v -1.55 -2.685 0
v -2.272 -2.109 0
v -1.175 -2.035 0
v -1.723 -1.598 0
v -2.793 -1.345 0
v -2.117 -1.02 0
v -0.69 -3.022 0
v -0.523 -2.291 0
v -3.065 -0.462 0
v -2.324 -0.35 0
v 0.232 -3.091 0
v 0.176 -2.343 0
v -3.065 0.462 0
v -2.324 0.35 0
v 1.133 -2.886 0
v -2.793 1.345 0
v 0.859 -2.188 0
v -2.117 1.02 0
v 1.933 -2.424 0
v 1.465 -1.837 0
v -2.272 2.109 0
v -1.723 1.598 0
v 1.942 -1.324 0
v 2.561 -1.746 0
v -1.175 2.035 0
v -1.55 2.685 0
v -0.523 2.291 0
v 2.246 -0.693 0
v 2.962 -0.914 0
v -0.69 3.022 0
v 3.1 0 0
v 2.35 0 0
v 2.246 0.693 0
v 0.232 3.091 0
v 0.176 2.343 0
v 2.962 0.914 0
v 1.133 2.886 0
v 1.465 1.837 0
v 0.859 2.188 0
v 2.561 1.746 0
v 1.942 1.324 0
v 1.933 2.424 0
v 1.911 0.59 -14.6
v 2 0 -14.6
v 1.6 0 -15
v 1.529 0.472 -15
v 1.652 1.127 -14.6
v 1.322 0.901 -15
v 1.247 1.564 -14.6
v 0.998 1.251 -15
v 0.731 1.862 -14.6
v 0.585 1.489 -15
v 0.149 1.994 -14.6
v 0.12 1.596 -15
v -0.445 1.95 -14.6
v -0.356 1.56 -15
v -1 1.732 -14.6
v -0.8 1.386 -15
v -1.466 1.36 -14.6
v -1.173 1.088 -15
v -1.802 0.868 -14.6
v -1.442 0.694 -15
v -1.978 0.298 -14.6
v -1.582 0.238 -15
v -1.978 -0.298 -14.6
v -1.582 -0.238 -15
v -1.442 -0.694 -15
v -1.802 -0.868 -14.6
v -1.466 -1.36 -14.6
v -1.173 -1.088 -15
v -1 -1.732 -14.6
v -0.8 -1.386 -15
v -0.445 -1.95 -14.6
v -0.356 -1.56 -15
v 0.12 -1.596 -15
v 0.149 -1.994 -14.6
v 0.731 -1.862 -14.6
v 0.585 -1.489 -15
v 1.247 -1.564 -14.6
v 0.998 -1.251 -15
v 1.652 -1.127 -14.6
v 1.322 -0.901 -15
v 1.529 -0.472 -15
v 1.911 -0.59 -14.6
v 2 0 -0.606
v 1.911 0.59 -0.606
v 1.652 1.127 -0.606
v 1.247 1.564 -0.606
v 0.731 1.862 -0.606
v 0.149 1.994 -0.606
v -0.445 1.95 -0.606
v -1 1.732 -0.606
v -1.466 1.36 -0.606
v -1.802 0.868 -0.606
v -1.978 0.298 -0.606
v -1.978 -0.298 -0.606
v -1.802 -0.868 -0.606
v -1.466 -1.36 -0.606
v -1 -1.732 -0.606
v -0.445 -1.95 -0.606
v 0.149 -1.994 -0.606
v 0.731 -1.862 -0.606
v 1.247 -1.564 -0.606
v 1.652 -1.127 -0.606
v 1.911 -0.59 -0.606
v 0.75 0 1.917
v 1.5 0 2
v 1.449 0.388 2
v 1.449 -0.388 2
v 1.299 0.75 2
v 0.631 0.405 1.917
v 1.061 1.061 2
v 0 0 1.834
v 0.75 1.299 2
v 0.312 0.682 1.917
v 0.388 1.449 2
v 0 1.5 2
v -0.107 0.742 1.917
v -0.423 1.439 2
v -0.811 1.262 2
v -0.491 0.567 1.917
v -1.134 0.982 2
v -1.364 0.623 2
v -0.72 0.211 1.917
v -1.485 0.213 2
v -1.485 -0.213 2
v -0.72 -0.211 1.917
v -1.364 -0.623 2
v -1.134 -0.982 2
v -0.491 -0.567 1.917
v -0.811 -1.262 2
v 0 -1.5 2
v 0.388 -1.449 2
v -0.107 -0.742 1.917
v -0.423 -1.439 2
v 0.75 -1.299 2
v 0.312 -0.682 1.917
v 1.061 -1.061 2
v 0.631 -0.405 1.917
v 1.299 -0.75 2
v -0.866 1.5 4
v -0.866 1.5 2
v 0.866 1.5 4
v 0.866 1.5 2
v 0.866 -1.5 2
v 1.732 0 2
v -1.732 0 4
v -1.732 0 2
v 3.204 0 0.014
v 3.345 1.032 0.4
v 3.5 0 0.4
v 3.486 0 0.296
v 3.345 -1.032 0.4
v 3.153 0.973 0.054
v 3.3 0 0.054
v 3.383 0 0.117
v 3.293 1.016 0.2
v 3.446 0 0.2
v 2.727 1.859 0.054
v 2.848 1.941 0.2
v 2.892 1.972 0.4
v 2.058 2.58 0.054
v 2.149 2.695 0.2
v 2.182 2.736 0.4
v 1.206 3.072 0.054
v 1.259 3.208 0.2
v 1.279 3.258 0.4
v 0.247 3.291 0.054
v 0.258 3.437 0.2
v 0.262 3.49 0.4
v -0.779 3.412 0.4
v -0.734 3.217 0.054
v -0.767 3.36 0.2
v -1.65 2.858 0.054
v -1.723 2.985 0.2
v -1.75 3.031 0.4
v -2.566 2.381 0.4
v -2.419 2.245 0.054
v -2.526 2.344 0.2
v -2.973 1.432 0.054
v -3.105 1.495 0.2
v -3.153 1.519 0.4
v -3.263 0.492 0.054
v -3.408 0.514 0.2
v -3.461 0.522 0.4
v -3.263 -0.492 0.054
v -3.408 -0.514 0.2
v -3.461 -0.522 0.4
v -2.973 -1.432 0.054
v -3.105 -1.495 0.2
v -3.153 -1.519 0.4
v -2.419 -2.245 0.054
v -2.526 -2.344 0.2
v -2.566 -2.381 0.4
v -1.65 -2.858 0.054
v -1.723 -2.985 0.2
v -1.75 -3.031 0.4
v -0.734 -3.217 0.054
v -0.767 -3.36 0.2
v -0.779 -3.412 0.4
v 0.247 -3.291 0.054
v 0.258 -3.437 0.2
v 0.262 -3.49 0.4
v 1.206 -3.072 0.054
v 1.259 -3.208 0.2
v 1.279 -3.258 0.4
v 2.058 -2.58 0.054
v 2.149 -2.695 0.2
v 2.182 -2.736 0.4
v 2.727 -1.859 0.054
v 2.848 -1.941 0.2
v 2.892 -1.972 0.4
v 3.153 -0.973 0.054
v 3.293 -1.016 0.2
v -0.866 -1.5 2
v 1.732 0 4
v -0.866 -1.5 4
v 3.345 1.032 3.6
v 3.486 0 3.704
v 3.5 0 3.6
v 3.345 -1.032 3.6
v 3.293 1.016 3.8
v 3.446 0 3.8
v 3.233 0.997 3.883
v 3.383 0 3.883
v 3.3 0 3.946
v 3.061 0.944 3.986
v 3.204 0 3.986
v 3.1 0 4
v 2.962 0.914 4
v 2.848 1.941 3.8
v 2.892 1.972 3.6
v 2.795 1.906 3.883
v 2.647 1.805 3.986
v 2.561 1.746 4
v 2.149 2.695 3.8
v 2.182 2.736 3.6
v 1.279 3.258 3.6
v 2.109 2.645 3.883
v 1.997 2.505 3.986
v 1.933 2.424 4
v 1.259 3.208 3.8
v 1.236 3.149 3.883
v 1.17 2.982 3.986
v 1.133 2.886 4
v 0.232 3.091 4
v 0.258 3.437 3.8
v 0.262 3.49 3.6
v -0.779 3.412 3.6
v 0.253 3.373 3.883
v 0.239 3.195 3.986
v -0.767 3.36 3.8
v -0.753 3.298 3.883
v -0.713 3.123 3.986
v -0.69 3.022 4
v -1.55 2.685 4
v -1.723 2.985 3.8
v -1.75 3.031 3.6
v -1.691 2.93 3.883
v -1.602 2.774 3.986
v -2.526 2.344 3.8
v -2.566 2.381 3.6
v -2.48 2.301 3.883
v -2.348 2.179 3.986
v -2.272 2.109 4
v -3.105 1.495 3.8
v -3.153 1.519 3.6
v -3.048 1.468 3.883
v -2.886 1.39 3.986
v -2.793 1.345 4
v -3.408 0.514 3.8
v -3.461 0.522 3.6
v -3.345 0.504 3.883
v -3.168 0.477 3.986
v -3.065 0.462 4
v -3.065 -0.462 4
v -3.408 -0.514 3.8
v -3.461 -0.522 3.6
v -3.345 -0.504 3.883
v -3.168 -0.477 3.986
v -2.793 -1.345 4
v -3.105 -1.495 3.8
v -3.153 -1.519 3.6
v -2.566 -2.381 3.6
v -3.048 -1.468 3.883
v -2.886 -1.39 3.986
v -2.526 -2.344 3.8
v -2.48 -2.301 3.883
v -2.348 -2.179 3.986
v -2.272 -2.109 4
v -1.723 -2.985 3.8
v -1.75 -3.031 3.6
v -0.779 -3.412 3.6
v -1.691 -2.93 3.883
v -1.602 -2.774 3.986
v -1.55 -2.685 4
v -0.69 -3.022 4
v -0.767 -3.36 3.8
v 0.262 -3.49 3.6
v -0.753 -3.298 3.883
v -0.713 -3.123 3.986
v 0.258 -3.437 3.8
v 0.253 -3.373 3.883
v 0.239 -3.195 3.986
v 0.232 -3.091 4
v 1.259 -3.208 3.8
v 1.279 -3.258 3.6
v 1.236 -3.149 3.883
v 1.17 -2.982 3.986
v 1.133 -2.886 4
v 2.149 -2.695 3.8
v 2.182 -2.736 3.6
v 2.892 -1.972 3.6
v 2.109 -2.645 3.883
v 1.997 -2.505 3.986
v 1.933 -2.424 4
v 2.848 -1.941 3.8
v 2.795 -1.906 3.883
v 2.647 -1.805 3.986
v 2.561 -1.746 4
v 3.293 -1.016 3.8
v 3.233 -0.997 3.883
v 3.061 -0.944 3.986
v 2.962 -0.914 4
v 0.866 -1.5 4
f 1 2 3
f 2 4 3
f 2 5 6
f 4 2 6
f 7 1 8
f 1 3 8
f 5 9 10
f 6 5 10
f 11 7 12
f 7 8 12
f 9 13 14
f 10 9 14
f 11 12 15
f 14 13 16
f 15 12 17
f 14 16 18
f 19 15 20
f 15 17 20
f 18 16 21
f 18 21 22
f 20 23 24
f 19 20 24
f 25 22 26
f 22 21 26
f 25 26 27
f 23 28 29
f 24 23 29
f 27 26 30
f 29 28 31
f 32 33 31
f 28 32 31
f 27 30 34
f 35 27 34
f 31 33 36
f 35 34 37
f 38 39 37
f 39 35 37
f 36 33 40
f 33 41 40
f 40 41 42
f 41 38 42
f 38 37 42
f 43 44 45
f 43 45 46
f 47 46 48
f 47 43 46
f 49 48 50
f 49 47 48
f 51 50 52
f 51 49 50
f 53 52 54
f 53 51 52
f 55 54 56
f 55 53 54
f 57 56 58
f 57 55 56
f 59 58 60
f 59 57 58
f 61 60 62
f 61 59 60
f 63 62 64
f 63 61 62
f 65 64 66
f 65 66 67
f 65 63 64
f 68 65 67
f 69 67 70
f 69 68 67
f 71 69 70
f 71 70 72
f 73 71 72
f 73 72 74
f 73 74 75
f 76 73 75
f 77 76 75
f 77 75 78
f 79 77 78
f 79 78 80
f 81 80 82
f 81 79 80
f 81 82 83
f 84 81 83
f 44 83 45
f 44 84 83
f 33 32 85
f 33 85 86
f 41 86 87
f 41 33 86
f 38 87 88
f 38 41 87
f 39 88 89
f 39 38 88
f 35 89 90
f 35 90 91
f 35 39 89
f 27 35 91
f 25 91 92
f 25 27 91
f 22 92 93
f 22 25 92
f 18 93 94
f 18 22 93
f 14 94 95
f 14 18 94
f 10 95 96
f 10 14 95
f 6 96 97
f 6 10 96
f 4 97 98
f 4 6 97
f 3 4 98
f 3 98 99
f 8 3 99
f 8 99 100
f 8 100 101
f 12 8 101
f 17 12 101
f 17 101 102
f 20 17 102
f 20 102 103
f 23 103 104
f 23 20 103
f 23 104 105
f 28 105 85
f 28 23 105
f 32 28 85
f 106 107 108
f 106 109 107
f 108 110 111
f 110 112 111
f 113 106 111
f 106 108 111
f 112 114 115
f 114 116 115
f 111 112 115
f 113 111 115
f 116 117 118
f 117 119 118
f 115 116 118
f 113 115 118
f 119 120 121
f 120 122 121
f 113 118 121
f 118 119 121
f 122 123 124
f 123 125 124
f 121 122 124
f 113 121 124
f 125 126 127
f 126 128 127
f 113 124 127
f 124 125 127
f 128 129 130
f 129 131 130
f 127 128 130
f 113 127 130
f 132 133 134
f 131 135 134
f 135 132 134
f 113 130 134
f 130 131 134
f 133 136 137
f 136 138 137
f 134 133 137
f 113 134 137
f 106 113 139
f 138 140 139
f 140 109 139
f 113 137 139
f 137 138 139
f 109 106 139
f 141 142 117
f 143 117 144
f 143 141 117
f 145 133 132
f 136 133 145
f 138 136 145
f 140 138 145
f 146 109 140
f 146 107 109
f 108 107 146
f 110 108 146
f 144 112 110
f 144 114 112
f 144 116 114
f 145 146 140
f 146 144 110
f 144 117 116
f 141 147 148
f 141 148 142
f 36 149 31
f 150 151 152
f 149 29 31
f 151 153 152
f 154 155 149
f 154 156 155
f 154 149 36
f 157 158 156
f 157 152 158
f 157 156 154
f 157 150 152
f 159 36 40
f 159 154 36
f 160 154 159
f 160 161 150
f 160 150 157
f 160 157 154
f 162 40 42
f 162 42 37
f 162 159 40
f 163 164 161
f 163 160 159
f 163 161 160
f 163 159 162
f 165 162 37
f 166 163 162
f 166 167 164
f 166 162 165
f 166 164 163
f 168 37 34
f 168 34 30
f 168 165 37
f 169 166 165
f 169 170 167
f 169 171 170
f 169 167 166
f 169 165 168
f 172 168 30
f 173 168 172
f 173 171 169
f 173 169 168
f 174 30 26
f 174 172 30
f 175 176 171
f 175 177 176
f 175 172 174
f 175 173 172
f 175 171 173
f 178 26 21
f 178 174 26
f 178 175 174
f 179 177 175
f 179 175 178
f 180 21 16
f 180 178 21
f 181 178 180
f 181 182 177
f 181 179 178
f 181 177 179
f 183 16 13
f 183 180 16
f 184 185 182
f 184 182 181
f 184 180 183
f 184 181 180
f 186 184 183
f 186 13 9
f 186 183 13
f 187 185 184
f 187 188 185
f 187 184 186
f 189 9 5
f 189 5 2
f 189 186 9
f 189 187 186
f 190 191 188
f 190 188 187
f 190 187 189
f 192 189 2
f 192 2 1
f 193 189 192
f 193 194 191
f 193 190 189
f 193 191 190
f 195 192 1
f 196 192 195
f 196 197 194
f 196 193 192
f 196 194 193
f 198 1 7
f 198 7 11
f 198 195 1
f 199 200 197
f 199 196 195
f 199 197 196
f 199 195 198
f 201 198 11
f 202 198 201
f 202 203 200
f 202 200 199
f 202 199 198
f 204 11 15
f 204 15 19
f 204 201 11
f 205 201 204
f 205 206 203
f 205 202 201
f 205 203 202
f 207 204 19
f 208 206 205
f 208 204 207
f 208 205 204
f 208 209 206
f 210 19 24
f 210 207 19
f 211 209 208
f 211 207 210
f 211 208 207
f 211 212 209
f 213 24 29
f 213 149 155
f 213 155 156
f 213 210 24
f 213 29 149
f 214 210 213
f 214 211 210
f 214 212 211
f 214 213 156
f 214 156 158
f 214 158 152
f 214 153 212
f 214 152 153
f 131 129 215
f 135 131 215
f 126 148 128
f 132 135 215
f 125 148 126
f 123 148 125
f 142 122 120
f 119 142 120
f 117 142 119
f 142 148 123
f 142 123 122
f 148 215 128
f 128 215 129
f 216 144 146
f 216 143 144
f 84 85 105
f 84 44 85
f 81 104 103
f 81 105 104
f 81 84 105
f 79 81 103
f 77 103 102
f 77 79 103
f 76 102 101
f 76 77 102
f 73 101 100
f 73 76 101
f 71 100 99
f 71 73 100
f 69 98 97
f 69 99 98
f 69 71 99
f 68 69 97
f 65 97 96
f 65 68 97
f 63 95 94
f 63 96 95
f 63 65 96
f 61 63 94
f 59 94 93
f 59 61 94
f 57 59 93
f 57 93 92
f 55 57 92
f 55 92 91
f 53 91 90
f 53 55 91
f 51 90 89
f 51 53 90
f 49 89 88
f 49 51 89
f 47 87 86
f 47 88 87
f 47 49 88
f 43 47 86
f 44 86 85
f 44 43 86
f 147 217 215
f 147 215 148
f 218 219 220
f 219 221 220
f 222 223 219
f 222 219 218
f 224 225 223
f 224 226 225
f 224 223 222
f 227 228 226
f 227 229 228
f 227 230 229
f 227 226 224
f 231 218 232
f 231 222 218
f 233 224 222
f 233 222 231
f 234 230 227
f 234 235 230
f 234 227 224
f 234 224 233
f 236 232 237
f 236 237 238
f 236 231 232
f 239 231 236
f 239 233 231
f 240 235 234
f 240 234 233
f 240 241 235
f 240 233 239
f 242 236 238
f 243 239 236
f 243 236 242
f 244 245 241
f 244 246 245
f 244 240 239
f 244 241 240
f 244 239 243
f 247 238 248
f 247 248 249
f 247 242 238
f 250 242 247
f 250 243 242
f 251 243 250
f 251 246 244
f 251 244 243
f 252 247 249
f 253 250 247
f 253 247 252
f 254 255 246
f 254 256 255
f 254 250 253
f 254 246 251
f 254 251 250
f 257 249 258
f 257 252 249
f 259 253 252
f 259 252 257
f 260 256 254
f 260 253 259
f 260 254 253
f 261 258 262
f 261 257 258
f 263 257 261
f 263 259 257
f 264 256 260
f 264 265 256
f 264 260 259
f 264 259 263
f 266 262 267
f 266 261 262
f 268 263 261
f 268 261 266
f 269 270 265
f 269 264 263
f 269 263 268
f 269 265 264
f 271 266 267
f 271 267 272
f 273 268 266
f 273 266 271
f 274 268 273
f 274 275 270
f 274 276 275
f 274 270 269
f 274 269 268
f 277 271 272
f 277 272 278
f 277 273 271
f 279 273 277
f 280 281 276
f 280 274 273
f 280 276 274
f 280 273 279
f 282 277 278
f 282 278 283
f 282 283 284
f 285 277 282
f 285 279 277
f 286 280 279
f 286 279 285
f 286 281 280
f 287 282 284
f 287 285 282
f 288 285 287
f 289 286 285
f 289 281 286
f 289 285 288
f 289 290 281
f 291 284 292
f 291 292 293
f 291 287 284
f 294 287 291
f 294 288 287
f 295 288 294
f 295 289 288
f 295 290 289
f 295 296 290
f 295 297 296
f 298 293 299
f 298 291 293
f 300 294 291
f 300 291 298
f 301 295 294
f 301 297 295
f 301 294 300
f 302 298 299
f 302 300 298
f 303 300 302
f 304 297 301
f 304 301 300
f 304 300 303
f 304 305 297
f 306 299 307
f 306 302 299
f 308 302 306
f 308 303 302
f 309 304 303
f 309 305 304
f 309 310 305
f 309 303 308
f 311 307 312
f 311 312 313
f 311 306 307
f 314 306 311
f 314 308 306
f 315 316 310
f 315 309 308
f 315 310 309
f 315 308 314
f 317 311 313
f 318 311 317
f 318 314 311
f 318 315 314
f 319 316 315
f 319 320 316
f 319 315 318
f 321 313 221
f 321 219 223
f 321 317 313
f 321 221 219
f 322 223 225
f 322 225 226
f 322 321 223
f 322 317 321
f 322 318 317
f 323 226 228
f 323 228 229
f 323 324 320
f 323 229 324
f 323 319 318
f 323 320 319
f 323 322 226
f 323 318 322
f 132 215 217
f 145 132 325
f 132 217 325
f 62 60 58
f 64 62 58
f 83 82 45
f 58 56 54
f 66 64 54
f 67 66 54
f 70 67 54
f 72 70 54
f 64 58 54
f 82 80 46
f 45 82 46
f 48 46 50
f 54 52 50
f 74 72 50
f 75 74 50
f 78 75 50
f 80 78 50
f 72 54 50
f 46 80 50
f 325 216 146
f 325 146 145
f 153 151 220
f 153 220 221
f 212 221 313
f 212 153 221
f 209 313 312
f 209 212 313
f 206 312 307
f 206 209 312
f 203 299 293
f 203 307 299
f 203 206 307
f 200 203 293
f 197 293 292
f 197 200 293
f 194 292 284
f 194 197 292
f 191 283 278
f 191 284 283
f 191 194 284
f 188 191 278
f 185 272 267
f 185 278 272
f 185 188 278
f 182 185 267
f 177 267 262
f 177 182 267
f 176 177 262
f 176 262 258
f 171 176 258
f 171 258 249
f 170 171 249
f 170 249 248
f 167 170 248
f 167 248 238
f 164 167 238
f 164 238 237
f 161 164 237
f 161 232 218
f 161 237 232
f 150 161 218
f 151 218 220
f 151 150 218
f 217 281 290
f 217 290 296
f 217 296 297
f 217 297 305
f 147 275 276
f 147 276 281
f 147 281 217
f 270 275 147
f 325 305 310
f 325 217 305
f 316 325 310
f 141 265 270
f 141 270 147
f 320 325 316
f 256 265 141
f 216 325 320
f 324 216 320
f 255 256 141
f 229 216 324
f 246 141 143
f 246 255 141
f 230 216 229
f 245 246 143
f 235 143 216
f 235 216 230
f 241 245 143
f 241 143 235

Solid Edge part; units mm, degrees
sketch "Sketch1" plane through (0, 0, 0) normal (0, -1, 0) x (1, 0, 0)
  line L0 (3.5, 4) -> (3.5, 0)
  line L1 (3.5, 0) -> (2.35, 0)
  line L2 (2.35, 0) -> (2, -0.6062)
  line L3 (2, -0.6062) -> (2, -15)
  line L4 (2, -15) -> (0, -15)
  line L5 (1.5, 2) -> (0, 1.834)
  line L6 (1.5, 4) -> (1.5, 2)
  line L7 (3.5, 4) -> (1.5, 4)
  dimension "D1" = 2
  dimension "D2" = 15
  dimension "D3" = 4
revolve "RevolvedProtrusion1" add sketch "Sketch1" angle 360 about axis through (0, 0, -6) along (0, 0, 1)
cosmetic_thread "Thread1" size "M4"
chamfer "Chamfer_1" distance 0.4 angle 45 1 edges at (-2, 0, -15)
fillet "Round_1" radius 0.4 2 edges at (-3.5, 0, 0) (-3.5, 0, 4)
sketch "Sketch2" plane through (0, 0, 4) normal (0, 0, 1) x (0, 1, 0)
  line L0 (-1.5, 0.866) -> (-1.5, -0.866)
  line L1 (0, -1.7321) -> (-1.5, -0.866)
  line L2 (1.5, -0.866) -> (0, -1.7321)
  line L3 (1.5, 0.866) -> (1.5, -0.866)
  line L4 (0, 1.7321) -> (1.5, 0.866)
  line L5 (-1.5, 0.866) -> (0, 1.7321)
extrude "Cutout1" cut sketch "Sketch2" against normal up to vertex (2 mm away)
properties material "Galvanized steel"
